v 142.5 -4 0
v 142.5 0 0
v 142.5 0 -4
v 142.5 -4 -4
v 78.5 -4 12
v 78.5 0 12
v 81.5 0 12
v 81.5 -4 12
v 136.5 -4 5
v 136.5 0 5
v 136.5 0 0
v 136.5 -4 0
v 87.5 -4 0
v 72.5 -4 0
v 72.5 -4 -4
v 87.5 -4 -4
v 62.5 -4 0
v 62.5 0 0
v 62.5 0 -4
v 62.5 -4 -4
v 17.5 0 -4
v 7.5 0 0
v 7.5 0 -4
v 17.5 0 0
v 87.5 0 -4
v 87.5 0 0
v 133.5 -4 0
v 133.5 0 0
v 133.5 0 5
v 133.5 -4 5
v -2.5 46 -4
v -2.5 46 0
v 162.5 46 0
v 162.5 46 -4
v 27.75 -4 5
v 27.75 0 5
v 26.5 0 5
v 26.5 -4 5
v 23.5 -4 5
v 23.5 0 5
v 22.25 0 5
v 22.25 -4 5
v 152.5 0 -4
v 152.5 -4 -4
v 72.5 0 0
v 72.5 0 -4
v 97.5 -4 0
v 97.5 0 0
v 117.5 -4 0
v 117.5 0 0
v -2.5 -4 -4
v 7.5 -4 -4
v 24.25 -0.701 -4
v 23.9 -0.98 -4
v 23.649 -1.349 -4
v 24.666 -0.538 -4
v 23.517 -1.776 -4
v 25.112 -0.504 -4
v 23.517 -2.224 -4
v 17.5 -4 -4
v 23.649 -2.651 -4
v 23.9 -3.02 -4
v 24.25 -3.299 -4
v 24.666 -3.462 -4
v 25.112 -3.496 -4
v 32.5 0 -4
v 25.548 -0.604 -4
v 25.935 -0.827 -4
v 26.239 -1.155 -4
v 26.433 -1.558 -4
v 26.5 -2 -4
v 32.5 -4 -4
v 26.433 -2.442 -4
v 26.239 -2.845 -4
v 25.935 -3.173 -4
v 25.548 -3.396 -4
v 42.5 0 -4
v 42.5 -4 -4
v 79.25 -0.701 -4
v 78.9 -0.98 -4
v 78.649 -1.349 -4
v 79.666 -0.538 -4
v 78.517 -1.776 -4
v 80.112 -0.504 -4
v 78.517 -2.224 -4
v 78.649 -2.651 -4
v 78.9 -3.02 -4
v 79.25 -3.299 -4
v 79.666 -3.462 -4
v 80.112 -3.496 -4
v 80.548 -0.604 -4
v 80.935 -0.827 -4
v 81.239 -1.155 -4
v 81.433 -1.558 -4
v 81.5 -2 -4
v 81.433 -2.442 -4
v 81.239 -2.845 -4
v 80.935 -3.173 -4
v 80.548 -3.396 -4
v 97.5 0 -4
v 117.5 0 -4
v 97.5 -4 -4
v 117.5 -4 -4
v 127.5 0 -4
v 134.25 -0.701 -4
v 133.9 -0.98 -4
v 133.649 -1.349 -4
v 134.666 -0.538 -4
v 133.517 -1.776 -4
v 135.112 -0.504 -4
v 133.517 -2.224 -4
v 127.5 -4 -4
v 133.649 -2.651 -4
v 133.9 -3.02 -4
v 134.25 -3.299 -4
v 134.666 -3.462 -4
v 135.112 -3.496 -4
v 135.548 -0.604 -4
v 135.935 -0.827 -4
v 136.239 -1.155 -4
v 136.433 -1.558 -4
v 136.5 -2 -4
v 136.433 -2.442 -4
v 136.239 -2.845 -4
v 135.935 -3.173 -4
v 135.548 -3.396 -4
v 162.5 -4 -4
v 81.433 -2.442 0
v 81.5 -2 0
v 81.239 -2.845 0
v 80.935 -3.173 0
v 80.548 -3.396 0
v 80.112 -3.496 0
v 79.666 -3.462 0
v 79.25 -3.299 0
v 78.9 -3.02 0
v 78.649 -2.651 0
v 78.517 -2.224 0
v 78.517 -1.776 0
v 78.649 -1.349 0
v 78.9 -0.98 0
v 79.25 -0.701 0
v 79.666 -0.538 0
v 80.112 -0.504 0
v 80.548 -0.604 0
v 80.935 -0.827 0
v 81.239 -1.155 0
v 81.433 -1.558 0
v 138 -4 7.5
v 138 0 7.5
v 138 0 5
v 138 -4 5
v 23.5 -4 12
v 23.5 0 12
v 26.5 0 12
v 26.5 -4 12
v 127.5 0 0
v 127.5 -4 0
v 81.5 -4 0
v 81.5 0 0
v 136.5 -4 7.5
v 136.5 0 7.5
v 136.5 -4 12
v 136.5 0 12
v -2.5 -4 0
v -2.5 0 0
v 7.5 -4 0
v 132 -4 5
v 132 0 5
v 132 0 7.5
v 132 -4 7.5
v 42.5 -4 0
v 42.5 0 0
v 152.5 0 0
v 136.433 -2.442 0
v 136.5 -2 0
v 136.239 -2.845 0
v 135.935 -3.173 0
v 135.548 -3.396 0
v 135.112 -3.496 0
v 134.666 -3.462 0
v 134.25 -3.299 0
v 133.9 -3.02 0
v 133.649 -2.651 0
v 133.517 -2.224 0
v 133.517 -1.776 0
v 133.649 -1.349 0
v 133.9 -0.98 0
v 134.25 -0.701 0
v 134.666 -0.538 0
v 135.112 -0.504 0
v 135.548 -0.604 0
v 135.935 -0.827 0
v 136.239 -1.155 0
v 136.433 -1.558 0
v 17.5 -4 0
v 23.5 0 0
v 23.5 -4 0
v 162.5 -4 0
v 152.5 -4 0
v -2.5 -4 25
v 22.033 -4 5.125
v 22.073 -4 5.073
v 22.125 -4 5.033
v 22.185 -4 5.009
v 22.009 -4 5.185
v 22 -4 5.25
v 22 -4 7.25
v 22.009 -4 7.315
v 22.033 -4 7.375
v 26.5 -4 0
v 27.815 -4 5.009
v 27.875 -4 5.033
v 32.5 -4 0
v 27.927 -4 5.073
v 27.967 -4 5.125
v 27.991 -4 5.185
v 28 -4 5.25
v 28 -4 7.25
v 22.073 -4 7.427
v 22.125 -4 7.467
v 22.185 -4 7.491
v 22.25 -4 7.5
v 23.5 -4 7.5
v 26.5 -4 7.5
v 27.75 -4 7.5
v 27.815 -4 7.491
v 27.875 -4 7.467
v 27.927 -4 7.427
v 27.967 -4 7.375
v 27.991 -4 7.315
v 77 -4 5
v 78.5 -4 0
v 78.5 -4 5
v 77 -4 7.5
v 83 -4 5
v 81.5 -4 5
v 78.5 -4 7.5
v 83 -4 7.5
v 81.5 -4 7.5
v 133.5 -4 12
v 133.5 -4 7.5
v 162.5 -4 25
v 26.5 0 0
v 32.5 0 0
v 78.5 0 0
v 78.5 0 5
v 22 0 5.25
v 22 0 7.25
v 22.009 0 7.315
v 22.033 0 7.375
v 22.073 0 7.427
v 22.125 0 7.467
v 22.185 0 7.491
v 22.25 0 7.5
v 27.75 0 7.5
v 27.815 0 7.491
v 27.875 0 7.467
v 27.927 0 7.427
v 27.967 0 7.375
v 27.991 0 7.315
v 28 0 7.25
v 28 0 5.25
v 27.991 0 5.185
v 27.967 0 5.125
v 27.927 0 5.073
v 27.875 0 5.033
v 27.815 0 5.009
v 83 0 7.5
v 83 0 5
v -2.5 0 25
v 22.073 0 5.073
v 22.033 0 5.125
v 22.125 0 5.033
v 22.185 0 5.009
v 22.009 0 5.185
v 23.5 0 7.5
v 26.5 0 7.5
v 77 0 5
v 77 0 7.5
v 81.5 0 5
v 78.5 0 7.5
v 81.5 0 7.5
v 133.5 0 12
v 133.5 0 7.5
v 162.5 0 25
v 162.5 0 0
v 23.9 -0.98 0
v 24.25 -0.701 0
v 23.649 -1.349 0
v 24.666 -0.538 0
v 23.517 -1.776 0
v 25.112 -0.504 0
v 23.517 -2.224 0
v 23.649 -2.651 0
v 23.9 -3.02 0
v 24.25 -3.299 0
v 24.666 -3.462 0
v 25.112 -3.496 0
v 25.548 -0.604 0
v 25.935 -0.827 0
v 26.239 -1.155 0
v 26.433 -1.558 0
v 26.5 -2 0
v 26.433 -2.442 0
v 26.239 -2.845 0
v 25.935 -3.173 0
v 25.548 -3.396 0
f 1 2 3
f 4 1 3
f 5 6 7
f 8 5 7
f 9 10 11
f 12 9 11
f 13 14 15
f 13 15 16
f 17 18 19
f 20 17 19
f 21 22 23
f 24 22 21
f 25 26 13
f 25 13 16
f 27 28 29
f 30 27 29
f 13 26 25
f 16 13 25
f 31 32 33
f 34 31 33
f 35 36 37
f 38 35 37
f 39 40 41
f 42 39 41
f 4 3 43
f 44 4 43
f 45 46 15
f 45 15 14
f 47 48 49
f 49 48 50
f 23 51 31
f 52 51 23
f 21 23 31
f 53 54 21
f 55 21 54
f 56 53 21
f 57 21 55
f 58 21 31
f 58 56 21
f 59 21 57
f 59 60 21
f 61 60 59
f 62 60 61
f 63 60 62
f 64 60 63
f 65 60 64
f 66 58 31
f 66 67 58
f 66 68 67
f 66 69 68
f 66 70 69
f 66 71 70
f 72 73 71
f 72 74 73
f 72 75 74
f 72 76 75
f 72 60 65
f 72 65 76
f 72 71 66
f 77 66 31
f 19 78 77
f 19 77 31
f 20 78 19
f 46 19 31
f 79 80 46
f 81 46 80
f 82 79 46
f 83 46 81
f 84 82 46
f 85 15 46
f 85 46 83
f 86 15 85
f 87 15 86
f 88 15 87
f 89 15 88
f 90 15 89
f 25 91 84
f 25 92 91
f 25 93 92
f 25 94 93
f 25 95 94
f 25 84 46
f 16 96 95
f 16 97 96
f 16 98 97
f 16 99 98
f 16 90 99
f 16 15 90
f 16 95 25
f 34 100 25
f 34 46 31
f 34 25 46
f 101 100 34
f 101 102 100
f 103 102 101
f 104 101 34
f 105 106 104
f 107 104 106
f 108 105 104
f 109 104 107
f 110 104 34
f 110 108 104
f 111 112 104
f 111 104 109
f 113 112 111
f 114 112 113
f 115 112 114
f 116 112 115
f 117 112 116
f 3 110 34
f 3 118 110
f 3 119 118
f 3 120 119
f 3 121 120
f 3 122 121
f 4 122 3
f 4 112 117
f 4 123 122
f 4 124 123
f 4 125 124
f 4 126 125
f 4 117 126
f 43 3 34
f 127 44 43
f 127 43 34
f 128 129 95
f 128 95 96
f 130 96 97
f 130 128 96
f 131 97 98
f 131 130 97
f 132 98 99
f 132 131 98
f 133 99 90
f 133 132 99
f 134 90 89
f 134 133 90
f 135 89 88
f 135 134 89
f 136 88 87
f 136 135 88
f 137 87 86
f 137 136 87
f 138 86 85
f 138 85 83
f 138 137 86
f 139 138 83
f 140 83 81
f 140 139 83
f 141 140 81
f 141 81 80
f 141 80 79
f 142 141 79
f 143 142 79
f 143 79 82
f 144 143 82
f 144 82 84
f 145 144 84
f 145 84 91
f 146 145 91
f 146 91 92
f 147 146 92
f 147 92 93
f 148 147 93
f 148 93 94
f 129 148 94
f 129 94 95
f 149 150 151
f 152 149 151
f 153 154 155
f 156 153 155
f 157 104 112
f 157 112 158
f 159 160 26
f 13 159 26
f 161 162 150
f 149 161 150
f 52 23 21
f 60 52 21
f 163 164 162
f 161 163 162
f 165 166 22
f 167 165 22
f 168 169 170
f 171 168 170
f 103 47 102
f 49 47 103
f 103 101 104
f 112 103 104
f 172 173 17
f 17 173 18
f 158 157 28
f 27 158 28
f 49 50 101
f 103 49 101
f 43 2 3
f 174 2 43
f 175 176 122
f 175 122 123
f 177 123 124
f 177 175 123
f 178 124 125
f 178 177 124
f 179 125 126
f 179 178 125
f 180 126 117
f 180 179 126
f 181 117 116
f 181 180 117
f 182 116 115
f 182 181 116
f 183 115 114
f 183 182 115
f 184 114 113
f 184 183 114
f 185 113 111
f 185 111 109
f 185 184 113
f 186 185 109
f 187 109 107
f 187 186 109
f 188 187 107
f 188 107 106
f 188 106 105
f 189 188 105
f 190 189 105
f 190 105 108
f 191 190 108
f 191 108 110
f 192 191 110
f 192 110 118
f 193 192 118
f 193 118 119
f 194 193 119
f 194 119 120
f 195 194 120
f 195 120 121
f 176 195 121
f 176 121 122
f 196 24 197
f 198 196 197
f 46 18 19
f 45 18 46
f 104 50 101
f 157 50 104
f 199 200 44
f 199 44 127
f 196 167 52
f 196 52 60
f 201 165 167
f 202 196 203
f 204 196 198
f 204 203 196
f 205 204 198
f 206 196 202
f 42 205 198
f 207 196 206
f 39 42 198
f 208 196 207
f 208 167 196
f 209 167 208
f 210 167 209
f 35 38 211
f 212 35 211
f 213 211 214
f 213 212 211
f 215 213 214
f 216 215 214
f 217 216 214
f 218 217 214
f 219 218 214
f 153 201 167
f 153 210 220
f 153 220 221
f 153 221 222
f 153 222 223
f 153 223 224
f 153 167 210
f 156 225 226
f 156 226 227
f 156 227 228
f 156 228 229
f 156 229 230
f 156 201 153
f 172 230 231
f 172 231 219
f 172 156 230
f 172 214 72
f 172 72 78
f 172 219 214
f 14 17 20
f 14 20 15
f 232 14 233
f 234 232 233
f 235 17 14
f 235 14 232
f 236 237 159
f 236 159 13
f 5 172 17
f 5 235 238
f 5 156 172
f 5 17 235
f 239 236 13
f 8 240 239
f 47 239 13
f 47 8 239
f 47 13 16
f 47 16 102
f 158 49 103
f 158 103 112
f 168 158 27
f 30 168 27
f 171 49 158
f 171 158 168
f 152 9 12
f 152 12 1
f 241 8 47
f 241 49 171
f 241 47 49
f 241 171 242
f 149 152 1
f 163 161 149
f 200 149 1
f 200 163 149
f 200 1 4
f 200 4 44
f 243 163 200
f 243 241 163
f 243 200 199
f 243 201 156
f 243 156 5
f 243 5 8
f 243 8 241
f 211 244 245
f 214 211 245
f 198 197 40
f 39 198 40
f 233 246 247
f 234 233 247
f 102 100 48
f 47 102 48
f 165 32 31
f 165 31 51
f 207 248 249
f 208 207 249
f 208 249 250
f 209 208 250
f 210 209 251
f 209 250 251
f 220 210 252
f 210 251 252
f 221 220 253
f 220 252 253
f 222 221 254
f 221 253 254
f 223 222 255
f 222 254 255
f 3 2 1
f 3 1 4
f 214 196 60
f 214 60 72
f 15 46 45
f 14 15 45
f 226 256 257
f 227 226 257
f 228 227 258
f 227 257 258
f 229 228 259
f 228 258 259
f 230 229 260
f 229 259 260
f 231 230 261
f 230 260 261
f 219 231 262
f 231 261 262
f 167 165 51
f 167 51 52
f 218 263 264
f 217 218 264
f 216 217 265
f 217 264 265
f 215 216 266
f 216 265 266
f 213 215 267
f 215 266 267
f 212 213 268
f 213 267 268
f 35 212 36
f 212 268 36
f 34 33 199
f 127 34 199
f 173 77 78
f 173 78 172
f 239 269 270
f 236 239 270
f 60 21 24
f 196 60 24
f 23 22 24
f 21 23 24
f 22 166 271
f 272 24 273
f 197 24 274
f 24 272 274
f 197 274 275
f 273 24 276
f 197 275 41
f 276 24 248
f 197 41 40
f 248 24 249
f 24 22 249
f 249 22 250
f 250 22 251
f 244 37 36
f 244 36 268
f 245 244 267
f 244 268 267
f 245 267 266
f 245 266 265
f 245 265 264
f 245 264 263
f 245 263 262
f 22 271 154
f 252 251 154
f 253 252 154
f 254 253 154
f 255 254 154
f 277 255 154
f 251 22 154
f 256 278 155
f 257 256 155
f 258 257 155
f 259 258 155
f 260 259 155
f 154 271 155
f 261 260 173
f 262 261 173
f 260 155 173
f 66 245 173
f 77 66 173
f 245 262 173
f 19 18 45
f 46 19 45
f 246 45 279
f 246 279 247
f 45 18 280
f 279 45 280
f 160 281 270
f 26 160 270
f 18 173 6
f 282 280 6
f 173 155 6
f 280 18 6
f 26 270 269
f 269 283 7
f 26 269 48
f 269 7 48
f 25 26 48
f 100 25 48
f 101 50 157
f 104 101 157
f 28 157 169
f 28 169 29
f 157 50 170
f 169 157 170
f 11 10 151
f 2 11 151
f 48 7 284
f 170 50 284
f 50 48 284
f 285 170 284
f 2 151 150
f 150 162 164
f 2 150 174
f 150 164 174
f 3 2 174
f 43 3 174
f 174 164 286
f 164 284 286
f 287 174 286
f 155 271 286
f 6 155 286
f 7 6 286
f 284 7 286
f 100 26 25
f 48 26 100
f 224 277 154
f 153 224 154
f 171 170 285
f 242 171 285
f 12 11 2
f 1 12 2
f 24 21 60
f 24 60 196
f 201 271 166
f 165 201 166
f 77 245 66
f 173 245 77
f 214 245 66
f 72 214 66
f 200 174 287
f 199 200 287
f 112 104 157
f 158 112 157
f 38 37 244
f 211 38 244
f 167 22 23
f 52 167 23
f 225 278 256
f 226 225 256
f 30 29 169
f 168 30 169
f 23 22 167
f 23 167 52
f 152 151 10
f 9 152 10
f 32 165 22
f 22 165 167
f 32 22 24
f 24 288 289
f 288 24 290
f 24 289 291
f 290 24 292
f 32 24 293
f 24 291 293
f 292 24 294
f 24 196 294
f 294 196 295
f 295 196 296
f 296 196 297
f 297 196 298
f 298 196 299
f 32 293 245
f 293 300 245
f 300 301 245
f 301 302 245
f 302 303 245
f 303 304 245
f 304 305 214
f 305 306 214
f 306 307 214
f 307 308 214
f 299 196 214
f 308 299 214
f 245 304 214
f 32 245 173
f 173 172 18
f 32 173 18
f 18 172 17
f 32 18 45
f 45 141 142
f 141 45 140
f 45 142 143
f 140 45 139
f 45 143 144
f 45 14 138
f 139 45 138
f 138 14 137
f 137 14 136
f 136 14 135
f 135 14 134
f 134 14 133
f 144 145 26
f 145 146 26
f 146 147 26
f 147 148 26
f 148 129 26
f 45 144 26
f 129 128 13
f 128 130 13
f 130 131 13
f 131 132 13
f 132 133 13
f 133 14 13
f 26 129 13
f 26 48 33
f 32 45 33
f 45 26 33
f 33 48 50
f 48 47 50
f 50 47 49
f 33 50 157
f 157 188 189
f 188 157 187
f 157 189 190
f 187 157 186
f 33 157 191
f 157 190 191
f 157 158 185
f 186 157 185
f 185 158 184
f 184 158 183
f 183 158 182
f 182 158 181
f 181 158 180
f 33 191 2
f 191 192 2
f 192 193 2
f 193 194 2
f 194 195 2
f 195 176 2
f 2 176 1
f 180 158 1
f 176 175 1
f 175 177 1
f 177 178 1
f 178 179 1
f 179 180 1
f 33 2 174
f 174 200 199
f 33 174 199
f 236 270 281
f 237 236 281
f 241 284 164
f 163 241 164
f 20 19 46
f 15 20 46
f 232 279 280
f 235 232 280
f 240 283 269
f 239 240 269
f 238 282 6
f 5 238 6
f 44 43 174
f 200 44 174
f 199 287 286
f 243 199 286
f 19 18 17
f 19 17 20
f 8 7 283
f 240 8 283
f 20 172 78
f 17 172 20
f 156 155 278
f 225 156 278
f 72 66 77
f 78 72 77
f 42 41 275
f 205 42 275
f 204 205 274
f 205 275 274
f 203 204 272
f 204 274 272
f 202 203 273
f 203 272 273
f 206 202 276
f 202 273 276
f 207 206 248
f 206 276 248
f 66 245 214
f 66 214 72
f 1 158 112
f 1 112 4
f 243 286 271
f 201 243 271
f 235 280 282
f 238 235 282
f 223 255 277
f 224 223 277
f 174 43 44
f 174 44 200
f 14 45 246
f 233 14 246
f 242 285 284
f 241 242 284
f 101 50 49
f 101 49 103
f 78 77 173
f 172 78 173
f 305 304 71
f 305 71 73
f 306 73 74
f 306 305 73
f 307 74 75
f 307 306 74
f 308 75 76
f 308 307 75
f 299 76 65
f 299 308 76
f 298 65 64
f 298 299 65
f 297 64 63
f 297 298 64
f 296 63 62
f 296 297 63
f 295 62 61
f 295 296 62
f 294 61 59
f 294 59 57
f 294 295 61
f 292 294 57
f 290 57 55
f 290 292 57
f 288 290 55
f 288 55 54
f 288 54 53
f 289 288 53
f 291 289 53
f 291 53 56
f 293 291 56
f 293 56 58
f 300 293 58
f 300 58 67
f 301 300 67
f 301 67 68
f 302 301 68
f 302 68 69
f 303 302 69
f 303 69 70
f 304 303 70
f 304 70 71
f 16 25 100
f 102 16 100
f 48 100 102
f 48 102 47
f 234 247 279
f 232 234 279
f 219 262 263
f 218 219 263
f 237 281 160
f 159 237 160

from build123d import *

# Parameters (mm, degrees)
F1_DEPTH = 4
F2_W     = 165
F2_H     = 50
F2_R     = 1.5
F3_DEPTH = 4


with BuildPart() as f1:
    # F0 (on Front) → F1 (new body)
    with BuildSketch(Plane.XZ):
        with BuildLine():
            Line((162.5, 25), (-2.5, 25))
            Line((-2.5, 25), (-2.5, 0))
            Line((-2.5, 0), (7.5, 0))
            Line((7.5, 0), (7.5, -4))
            Line((7.5, -4), (17.5, -4))
            Line((17.5, -4), (17.5, 0))
            Line((17.5, 0), (23.5, 0))
            Line((23.5, 0), (23.5, 5))
            Line((23.5, 5), (22.25, 5))
            ThreePointArc((22.25, 5), (22.073223, 5.073223), (22, 5.25))
            Line((22, 5.25), (22, 7.25))
            ThreePointArc((22, 7.25), (22.073223, 7.426777), (22.25, 7.5))
            Line((22.25, 7.5), (23.5, 7.5))
            Line((23.5, 7.5), (23.5, 12))
            Line((23.5, 12), (26.5, 12))
            Line((26.5, 12), (26.5, 7.5))
            Line((26.5, 7.5), (27.75, 7.5))
            ThreePointArc((27.75, 7.5), (27.926777, 7.426777), (28, 7.25))
            Line((28, 7.25), (28, 5.25))
            ThreePointArc((28, 5.25), (27.926777, 5.073223), (27.75, 5))
            Line((27.75, 5), (26.5, 5))
            Line((26.5, 5), (26.5, 0))
            Line((26.5, 0), (32.5, 0))
            Line((32.5, 0), (32.5, -4))
            Line((32.5, -4), (42.5, -4))
            Line((42.5, -4), (42.5, 0))
            Line((42.5, 0), (62.5, 0))
            Line((62.5, 0), (62.5, -4))
            Line((62.5, -4), (72.5, -4))
            Line((72.5, -4), (72.5, 0))
            Line((72.5, 0), (78.5, 0))
            Line((78.5, 0), (78.5, 5))
            Line((78.5, 5), (77, 5))
            Line((77, 5), (77, 7.5))
            Line((77, 7.5), (78.5, 7.5))
            Line((78.5, 7.5), (78.5, 12))
            Line((78.5, 12), (81.5, 12))
            Line((81.5, 12), (81.5, 7.5))
            Line((81.5, 7.5), (83, 7.5))
            Line((83, 7.5), (83, 5))
            Line((83, 5), (81.5, 5))
            Line((81.5, 5), (81.5, 0))
            Line((81.5, 0), (87.5, 0))
            Line((87.5, 0), (87.5, -4))
            Line((87.5, -4), (97.5, -4))
            Line((97.5, -4), (97.5, 0))
            Line((97.5, 0), (117.5, 0))
            Line((117.5, 0), (117.5, -4))
            Line((117.5, -4), (127.5, -4))
            Line((127.5, -4), (127.5, 0))
            Line((127.5, 0), (133.5, 0))
            Line((133.5, 0), (133.5, 5))
            Line((133.5, 5), (132, 5))
            Line((132, 5), (132, 7.5))
            Line((132, 7.5), (133.5, 7.5))
            Line((133.5, 7.5), (133.5, 12))
            Line((133.5, 12), (136.5, 12))
            Line((136.5, 12), (136.5, 7.5))
            Line((136.5, 7.5), (138, 7.5))
            Line((138, 7.5), (138, 5))
            Line((138, 5), (136.5, 5))
            Line((136.5, 5), (136.5, 0))
            Line((136.5, 0), (142.5, 0))
            Line((142.5, 0), (142.5, -4))
            Line((142.5, -4), (152.5, -4))
            Line((152.5, -4), (152.5, 0))
            Line((152.5, 0), (162.5, 0))
            Line((162.5, 0), (162.5, 25))
        make_face()
    extrude(amount=F1_DEPTH)


with BuildPart() as f3:
    # F2 (on face) → F3 (new body)
    with BuildSketch(Plane(origin=(0, 0, 0), x_dir=(1, 0, 0), z_dir=(0, 0, -1))):
        with Locations((80, -21)):
            Rectangle(F2_W, F2_H)
        with Locations((25, 2)):
            Circle(F2_R, mode=Mode.SUBTRACT)
        with Locations((80, 2)):
            Circle(F2_R, mode=Mode.SUBTRACT)
        with Locations((135, 2)):
            Circle(F2_R, mode=Mode.SUBTRACT)
    extrude(amount=F3_DEPTH)

    # F4: cut F1
    add(f1.part, mode=Mode.SUBTRACT)


solid = Compound([f1.part, f3.part])
